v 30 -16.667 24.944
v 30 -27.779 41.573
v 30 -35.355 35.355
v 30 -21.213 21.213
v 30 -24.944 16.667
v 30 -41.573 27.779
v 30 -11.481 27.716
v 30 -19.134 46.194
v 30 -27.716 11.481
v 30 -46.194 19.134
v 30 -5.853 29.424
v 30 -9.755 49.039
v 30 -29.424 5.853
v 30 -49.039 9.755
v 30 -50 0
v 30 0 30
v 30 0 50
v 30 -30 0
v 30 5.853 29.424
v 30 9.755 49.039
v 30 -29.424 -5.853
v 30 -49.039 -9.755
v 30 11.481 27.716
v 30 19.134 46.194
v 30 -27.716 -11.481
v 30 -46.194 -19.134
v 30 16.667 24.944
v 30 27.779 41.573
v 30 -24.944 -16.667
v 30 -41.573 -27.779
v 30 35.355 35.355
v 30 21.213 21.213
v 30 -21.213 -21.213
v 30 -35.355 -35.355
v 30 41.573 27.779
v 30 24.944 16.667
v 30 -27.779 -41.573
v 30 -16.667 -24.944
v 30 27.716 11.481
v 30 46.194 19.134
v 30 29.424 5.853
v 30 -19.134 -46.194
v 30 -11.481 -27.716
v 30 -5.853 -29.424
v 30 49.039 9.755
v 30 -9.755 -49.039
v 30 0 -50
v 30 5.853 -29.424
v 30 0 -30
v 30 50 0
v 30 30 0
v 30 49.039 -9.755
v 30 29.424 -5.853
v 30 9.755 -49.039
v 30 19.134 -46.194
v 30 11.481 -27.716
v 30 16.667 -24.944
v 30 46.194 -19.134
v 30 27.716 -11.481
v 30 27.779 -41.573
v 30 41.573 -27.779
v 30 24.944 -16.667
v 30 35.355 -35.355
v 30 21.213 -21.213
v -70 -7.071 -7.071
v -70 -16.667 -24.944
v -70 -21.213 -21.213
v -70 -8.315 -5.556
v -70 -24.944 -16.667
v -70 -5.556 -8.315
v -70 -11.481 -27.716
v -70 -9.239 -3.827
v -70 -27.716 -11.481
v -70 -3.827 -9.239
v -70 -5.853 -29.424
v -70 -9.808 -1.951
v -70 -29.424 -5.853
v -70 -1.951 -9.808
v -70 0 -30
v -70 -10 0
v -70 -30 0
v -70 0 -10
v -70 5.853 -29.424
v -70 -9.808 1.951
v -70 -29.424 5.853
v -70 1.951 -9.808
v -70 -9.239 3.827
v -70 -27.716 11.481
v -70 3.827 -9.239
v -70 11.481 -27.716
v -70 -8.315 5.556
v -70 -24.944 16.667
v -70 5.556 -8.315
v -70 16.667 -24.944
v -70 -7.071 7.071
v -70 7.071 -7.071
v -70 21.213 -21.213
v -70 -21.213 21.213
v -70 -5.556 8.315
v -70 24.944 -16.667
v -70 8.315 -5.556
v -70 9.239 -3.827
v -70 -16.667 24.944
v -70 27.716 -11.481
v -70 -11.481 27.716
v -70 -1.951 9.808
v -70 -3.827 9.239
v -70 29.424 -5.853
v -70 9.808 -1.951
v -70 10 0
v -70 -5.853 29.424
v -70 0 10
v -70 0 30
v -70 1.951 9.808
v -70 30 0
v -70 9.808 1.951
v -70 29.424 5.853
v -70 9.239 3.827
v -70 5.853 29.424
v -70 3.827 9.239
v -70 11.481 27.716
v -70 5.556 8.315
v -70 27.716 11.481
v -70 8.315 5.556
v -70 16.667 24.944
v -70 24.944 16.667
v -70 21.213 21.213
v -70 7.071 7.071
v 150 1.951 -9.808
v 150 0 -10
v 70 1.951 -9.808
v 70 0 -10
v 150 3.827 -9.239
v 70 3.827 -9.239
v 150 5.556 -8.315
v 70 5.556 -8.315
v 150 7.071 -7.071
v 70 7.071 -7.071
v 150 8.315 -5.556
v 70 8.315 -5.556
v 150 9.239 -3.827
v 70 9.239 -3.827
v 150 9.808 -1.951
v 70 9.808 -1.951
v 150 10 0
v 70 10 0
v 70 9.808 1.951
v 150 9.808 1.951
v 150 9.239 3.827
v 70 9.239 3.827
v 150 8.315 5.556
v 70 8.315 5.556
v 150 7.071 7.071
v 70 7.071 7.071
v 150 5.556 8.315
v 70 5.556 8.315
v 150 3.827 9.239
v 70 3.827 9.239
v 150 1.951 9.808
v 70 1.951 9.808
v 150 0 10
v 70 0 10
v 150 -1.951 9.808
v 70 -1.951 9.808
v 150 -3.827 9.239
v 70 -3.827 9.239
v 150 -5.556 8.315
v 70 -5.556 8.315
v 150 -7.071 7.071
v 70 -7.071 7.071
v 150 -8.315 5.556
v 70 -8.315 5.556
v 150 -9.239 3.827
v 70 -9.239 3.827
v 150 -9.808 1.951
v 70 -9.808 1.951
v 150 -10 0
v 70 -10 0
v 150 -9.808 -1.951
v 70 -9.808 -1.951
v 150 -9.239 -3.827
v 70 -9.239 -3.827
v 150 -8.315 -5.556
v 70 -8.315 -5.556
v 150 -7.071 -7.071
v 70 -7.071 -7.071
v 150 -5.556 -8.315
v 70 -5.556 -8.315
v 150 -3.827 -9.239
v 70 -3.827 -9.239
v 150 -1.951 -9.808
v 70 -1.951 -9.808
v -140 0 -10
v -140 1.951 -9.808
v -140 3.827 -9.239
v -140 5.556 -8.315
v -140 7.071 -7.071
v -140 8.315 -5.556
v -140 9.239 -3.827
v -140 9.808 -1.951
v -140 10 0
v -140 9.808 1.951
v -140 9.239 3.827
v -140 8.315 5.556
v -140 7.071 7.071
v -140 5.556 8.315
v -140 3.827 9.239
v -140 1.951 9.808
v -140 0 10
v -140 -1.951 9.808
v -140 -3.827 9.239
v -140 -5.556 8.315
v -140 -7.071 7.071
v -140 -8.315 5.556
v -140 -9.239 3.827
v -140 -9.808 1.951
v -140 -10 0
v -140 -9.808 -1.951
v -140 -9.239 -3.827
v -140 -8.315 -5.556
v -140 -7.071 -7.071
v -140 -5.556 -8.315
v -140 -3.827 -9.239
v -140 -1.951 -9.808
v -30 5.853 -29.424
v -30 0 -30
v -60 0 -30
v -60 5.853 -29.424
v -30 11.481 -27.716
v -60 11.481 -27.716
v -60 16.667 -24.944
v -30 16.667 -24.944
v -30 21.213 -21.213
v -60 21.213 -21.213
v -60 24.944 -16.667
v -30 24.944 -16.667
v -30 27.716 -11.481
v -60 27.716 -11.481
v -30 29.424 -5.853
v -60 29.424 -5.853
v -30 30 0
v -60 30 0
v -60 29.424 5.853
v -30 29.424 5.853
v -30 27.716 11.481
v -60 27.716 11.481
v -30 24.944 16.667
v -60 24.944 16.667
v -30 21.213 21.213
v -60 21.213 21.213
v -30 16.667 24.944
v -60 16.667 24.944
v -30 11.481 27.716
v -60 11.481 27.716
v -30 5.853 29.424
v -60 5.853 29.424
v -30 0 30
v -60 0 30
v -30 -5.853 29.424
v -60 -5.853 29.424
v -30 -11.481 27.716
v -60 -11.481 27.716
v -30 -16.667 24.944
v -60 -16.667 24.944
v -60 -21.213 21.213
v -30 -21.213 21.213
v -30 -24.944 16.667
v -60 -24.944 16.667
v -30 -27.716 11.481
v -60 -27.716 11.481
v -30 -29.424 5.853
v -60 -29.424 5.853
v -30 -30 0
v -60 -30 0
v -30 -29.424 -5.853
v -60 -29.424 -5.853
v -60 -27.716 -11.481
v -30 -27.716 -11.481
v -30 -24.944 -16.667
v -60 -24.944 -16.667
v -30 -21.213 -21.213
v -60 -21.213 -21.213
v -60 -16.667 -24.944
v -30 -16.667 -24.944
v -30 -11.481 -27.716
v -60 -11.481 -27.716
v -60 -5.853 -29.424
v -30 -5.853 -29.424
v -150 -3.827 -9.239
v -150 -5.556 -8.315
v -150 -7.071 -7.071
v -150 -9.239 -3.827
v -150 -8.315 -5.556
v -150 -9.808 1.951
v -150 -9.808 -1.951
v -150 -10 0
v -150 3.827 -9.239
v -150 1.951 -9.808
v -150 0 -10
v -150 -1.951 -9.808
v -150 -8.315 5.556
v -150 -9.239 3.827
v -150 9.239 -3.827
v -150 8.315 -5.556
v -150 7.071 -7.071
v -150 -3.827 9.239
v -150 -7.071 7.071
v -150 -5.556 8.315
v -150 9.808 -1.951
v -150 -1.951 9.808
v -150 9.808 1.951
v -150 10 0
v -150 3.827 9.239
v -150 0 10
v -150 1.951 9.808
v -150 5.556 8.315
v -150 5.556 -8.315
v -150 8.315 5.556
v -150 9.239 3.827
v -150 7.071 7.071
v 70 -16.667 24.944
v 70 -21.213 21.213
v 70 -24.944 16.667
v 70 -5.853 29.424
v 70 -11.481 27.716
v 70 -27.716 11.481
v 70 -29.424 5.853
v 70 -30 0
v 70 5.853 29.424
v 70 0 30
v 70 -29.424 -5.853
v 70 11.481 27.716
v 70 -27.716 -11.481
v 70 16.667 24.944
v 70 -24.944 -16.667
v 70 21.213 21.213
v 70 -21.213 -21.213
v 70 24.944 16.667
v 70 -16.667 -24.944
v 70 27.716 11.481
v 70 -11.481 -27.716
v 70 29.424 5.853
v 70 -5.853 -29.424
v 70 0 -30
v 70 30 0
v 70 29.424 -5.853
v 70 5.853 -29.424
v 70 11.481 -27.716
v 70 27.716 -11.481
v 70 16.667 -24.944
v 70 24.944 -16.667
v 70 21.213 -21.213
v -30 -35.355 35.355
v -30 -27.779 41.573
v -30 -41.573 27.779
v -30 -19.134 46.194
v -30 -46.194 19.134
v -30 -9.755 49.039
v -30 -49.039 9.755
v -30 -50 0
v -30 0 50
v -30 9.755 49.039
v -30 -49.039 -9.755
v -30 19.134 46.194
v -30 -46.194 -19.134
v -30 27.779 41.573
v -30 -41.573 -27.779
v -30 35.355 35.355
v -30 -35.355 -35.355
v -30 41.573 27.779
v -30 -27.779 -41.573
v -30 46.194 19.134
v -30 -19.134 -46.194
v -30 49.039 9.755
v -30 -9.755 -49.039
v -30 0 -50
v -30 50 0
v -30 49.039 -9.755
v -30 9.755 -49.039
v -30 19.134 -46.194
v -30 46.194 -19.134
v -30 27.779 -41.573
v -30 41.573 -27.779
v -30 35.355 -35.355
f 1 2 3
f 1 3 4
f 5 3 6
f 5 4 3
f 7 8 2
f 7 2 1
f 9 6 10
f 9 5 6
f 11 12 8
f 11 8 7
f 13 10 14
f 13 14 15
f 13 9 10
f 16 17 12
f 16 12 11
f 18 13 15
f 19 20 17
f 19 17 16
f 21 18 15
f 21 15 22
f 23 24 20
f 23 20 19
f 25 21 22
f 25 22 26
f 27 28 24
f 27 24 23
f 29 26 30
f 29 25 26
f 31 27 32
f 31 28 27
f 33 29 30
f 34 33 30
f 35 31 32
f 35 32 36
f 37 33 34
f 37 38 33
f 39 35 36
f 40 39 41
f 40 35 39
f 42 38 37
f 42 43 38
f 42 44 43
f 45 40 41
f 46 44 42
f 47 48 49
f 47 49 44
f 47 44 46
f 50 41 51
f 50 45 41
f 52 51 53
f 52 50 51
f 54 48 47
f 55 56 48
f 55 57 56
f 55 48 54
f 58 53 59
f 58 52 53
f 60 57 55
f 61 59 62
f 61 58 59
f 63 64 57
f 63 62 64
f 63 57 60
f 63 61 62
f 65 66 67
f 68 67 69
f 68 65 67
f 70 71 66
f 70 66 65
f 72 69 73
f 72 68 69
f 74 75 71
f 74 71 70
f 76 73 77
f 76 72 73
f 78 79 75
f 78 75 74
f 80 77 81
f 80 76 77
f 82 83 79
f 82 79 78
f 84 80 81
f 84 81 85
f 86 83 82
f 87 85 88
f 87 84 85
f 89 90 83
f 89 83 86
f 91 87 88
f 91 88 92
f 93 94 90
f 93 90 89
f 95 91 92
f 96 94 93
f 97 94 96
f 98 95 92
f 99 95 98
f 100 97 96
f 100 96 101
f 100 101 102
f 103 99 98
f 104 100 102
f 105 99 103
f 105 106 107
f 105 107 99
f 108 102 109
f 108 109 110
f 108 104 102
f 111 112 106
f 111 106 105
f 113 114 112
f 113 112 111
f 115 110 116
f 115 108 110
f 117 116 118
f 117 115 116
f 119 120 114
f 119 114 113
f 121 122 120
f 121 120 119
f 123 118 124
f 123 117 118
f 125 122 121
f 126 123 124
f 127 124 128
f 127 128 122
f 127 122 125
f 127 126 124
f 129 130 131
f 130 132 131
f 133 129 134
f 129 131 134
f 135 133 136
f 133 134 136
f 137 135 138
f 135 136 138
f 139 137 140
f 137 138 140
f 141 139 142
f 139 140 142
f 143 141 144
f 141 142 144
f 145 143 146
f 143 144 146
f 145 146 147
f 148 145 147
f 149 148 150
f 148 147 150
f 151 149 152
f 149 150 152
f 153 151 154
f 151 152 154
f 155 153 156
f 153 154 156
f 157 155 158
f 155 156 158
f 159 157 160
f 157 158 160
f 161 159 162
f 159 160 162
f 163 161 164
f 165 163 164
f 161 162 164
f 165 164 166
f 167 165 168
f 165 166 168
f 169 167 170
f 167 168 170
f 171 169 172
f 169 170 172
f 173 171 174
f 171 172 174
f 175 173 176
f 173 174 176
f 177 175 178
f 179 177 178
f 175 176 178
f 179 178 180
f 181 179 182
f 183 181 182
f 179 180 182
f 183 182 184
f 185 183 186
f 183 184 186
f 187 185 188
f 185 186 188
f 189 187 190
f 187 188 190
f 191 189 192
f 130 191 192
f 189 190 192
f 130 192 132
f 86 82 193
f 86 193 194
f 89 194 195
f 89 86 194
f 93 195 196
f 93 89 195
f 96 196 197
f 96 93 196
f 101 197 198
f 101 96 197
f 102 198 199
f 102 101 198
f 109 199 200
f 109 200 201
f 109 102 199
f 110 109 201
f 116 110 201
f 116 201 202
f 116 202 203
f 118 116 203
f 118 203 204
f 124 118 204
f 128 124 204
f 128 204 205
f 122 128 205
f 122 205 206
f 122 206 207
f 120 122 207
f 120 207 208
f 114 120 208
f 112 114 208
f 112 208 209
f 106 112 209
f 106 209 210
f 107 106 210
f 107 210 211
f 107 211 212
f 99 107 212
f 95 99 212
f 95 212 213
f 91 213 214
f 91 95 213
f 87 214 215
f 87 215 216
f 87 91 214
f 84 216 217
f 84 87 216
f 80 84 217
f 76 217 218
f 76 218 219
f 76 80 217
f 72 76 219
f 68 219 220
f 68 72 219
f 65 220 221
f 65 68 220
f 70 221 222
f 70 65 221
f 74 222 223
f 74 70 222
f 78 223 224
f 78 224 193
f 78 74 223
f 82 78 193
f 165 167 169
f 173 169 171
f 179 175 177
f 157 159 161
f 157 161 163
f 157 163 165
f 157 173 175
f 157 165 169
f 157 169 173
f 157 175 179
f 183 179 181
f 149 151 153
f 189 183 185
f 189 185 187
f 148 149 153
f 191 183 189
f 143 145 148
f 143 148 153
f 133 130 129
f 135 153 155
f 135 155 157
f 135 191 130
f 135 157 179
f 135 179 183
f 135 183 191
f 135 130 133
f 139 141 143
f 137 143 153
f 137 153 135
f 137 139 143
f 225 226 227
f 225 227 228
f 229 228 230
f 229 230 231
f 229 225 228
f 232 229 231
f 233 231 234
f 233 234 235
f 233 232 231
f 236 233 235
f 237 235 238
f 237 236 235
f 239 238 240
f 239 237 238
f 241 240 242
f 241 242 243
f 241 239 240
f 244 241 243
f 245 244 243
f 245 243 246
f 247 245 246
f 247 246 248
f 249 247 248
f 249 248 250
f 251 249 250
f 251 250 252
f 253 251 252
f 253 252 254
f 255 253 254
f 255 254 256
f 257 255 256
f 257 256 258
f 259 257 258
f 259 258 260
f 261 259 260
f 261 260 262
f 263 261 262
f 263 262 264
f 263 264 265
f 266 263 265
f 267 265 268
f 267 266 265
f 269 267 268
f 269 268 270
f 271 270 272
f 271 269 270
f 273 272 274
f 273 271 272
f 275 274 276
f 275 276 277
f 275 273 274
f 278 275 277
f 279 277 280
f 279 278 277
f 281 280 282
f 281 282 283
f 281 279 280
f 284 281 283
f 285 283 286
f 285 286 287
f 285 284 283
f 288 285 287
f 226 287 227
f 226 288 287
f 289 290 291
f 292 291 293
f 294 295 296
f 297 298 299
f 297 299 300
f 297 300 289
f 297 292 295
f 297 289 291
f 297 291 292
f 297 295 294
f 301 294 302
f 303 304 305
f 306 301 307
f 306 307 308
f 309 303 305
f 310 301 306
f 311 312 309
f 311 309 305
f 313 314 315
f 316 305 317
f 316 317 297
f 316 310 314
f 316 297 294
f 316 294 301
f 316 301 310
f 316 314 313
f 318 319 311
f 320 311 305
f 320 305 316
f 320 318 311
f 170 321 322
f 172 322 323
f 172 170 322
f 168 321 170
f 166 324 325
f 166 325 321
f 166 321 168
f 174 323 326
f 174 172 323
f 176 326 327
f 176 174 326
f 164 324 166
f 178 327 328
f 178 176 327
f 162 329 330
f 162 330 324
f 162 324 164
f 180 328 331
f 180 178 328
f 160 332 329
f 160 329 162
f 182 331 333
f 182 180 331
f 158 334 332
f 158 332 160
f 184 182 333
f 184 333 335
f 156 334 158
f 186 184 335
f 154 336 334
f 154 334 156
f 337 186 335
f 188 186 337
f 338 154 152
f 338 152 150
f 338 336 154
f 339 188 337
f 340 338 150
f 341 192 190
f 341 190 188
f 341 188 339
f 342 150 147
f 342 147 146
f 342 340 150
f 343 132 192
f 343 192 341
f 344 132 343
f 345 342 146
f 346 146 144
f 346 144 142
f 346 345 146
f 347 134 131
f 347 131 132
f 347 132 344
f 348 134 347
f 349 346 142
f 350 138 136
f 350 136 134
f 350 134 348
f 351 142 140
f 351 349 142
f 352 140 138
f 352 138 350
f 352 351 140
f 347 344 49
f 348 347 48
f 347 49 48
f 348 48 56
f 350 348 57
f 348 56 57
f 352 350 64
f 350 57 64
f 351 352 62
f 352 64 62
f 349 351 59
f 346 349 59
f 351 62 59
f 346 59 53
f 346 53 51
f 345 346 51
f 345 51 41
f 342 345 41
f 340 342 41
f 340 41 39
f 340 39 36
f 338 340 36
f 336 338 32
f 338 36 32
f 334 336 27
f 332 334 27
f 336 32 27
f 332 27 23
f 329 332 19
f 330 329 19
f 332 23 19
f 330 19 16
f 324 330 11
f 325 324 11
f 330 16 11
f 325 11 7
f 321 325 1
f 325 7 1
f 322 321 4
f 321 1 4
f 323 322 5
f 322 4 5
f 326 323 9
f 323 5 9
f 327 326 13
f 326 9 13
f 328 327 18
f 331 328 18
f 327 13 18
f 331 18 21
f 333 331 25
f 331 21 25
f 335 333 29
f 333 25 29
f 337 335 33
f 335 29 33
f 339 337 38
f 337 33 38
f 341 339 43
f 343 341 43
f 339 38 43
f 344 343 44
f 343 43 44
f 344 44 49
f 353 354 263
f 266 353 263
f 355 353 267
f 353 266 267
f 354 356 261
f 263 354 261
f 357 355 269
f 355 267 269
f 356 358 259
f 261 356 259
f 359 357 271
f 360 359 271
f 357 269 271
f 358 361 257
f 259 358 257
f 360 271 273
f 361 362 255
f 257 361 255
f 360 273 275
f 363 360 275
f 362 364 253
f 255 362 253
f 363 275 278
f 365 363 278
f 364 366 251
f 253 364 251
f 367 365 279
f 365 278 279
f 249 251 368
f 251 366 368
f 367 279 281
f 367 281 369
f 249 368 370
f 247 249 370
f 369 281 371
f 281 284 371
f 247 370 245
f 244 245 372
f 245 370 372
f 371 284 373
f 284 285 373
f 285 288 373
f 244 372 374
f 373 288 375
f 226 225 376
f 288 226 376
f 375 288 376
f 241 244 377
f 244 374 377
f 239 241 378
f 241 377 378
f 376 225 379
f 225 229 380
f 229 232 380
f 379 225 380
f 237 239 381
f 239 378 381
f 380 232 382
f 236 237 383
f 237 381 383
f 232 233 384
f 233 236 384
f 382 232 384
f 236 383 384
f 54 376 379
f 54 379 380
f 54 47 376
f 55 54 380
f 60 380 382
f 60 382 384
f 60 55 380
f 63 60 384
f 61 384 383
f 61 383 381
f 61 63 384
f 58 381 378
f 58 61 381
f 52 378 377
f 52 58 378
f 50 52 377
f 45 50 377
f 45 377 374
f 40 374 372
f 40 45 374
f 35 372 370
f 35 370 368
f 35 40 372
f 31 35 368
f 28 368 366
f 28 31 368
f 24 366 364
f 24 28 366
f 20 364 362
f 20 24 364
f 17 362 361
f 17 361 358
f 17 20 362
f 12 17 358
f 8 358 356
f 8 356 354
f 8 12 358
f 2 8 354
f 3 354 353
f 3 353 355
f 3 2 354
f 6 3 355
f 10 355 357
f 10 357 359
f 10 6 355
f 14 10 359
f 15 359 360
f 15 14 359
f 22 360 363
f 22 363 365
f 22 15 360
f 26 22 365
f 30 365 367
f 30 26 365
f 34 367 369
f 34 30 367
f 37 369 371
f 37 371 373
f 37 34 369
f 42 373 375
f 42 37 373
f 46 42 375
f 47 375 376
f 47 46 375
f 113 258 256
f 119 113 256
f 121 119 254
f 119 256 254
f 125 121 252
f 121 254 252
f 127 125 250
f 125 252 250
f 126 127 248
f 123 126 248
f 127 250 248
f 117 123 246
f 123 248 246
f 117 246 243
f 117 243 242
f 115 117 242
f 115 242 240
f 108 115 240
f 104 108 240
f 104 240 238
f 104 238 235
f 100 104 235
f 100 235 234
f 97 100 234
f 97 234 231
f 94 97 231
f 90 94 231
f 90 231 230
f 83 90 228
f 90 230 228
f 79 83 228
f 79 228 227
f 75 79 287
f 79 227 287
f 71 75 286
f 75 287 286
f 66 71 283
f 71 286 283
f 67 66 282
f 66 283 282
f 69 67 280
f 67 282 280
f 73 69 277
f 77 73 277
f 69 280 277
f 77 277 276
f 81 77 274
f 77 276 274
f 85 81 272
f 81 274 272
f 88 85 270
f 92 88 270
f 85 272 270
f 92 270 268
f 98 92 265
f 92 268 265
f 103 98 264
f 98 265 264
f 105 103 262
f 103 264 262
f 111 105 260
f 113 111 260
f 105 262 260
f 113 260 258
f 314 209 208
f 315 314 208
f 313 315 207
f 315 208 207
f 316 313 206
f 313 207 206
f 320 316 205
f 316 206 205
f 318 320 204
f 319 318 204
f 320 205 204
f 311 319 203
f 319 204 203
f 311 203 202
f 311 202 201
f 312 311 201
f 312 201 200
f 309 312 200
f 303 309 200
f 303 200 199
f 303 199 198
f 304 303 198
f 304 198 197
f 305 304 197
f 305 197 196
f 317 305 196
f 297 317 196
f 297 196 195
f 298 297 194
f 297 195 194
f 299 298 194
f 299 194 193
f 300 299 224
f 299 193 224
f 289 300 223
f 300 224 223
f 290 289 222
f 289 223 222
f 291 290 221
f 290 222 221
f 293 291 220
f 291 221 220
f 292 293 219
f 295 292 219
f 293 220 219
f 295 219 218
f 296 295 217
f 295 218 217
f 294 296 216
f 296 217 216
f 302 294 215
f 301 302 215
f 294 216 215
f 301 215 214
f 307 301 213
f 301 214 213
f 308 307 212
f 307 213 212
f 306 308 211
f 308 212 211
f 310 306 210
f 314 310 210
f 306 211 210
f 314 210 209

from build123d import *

# Parameters (mm, degrees)
SKETCH1_R           = 50
BOSS_EXTRUDE1_DEPTH = 30
SKETCH2_R           = 30
BOSS_EXTRUDE2_DEPTH = 30
SKETCH3_R           = 10
BOSS_EXTRUDE3_DEPTH = 80
SKETCH7_R           = 30
BOSS_EXTRUDE4_DEPTH = 10
SKETCH8_R           = 10
BOSS_EXTRUDE5_DEPTH = 10
SKETCH9_R           = 30
BOSS_EXTRUDE6_DEPTH = 10
SKETCH10_R          = 10
BOSS_EXTRUDE7_DEPTH = 10


with BuildPart() as part:
    # Sketch1 → Boss-Extrude1 (new body)
    with BuildSketch(Plane(origin=(0, 0, 0), x_dir=(0, 0, -1), z_dir=(1, 0, 0))):
        Circle(SKETCH1_R)
    boss_extrude1 = extrude(amount=BOSS_EXTRUDE1_DEPTH)

    # Sketch2 → Boss-Extrude2 (add)
    with BuildSketch(Plane(origin=(30, 0, 0), x_dir=(0, 0, -1), z_dir=(1, 0, 0))):
        Circle(SKETCH2_R)
    boss_extrude2 = extrude(amount=BOSS_EXTRUDE2_DEPTH)

    # Sketch3 → Boss-Extrude3 (add)
    with BuildSketch(Plane(origin=(60, 0, 0), x_dir=(0, 0, -1), z_dir=(1, 0, 0))):
        Circle(SKETCH3_R)
    boss_extrude3 = extrude(amount=BOSS_EXTRUDE3_DEPTH)

    # Mirror1: Boss-Extrude1, Boss-Extrude2, Boss-Extrude3 across plane
    add(boss_extrude1.mirror(Plane(origin=(0, 0, 0), x_dir=(0, 0, 1), z_dir=(1, 0, 0))))
    add(boss_extrude2.mirror(Plane(origin=(0, 0, 0), x_dir=(0, 0, 1), z_dir=(1, 0, 0))))
    add(boss_extrude3.mirror(Plane(origin=(0, 0, 0), x_dir=(0, 0, 1), z_dir=(1, 0, 0))))

    # Sketch7 → Boss-Extrude4 (add)
    with BuildSketch(Plane.ZY.offset(60)):
        Circle(SKETCH7_R)
    extrude(amount=BOSS_EXTRUDE4_DEPTH)

    # Sketch8 → Boss-Extrude5 (add)
    with BuildSketch(Plane.ZY.offset(140)):
        Circle(SKETCH8_R)
    extrude(amount=BOSS_EXTRUDE5_DEPTH)

    # Sketch9 → Boss-Extrude6 (add)
    with BuildSketch(Plane(origin=(60, 0, 0), x_dir=(0, 0, -1), z_dir=(1, 0, 0))):
        Circle(SKETCH9_R)
    extrude(amount=BOSS_EXTRUDE6_DEPTH)

    # Sketch10 → Boss-Extrude7 (add)
    with BuildSketch(Plane(origin=(140, 0, 0), x_dir=(0, 0, -1), z_dir=(1, 0, 0))):
        Circle(SKETCH10_R)
    extrude(amount=BOSS_EXTRUDE7_DEPTH)


solid = part.part
